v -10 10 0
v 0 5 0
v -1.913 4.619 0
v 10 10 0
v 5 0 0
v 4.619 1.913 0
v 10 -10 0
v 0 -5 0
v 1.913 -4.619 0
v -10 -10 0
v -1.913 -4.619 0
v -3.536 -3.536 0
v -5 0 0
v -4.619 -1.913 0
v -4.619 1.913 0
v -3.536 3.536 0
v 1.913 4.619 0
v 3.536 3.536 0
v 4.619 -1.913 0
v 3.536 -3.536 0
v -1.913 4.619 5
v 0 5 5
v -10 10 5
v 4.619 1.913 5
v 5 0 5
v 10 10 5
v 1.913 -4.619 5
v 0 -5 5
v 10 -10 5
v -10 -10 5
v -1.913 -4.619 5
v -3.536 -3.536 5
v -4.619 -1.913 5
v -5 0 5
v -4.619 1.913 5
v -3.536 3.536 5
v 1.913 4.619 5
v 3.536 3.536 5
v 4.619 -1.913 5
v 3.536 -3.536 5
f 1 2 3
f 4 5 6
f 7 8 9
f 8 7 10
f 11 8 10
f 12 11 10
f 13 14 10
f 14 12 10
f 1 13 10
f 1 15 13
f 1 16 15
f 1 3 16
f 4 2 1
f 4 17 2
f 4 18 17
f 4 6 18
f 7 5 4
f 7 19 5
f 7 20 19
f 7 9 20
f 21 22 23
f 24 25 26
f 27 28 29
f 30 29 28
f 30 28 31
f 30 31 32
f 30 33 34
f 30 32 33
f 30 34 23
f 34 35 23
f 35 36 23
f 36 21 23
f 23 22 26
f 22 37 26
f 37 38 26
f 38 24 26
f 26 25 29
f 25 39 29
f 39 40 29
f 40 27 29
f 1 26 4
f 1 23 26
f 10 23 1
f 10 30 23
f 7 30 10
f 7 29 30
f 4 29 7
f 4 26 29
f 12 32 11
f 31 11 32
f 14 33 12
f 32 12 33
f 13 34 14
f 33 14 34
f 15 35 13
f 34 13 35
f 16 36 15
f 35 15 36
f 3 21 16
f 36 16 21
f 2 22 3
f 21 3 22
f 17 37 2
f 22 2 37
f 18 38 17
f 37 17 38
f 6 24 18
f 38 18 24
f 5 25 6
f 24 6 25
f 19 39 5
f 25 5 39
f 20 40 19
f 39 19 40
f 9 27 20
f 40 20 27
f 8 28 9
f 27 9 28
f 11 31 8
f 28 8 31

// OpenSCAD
// 2D boolean then extrude: a 20x20x5 plate with a round hole.
linear_extrude(5) difference() {
  square(20, center=true);
  circle(5);
}
